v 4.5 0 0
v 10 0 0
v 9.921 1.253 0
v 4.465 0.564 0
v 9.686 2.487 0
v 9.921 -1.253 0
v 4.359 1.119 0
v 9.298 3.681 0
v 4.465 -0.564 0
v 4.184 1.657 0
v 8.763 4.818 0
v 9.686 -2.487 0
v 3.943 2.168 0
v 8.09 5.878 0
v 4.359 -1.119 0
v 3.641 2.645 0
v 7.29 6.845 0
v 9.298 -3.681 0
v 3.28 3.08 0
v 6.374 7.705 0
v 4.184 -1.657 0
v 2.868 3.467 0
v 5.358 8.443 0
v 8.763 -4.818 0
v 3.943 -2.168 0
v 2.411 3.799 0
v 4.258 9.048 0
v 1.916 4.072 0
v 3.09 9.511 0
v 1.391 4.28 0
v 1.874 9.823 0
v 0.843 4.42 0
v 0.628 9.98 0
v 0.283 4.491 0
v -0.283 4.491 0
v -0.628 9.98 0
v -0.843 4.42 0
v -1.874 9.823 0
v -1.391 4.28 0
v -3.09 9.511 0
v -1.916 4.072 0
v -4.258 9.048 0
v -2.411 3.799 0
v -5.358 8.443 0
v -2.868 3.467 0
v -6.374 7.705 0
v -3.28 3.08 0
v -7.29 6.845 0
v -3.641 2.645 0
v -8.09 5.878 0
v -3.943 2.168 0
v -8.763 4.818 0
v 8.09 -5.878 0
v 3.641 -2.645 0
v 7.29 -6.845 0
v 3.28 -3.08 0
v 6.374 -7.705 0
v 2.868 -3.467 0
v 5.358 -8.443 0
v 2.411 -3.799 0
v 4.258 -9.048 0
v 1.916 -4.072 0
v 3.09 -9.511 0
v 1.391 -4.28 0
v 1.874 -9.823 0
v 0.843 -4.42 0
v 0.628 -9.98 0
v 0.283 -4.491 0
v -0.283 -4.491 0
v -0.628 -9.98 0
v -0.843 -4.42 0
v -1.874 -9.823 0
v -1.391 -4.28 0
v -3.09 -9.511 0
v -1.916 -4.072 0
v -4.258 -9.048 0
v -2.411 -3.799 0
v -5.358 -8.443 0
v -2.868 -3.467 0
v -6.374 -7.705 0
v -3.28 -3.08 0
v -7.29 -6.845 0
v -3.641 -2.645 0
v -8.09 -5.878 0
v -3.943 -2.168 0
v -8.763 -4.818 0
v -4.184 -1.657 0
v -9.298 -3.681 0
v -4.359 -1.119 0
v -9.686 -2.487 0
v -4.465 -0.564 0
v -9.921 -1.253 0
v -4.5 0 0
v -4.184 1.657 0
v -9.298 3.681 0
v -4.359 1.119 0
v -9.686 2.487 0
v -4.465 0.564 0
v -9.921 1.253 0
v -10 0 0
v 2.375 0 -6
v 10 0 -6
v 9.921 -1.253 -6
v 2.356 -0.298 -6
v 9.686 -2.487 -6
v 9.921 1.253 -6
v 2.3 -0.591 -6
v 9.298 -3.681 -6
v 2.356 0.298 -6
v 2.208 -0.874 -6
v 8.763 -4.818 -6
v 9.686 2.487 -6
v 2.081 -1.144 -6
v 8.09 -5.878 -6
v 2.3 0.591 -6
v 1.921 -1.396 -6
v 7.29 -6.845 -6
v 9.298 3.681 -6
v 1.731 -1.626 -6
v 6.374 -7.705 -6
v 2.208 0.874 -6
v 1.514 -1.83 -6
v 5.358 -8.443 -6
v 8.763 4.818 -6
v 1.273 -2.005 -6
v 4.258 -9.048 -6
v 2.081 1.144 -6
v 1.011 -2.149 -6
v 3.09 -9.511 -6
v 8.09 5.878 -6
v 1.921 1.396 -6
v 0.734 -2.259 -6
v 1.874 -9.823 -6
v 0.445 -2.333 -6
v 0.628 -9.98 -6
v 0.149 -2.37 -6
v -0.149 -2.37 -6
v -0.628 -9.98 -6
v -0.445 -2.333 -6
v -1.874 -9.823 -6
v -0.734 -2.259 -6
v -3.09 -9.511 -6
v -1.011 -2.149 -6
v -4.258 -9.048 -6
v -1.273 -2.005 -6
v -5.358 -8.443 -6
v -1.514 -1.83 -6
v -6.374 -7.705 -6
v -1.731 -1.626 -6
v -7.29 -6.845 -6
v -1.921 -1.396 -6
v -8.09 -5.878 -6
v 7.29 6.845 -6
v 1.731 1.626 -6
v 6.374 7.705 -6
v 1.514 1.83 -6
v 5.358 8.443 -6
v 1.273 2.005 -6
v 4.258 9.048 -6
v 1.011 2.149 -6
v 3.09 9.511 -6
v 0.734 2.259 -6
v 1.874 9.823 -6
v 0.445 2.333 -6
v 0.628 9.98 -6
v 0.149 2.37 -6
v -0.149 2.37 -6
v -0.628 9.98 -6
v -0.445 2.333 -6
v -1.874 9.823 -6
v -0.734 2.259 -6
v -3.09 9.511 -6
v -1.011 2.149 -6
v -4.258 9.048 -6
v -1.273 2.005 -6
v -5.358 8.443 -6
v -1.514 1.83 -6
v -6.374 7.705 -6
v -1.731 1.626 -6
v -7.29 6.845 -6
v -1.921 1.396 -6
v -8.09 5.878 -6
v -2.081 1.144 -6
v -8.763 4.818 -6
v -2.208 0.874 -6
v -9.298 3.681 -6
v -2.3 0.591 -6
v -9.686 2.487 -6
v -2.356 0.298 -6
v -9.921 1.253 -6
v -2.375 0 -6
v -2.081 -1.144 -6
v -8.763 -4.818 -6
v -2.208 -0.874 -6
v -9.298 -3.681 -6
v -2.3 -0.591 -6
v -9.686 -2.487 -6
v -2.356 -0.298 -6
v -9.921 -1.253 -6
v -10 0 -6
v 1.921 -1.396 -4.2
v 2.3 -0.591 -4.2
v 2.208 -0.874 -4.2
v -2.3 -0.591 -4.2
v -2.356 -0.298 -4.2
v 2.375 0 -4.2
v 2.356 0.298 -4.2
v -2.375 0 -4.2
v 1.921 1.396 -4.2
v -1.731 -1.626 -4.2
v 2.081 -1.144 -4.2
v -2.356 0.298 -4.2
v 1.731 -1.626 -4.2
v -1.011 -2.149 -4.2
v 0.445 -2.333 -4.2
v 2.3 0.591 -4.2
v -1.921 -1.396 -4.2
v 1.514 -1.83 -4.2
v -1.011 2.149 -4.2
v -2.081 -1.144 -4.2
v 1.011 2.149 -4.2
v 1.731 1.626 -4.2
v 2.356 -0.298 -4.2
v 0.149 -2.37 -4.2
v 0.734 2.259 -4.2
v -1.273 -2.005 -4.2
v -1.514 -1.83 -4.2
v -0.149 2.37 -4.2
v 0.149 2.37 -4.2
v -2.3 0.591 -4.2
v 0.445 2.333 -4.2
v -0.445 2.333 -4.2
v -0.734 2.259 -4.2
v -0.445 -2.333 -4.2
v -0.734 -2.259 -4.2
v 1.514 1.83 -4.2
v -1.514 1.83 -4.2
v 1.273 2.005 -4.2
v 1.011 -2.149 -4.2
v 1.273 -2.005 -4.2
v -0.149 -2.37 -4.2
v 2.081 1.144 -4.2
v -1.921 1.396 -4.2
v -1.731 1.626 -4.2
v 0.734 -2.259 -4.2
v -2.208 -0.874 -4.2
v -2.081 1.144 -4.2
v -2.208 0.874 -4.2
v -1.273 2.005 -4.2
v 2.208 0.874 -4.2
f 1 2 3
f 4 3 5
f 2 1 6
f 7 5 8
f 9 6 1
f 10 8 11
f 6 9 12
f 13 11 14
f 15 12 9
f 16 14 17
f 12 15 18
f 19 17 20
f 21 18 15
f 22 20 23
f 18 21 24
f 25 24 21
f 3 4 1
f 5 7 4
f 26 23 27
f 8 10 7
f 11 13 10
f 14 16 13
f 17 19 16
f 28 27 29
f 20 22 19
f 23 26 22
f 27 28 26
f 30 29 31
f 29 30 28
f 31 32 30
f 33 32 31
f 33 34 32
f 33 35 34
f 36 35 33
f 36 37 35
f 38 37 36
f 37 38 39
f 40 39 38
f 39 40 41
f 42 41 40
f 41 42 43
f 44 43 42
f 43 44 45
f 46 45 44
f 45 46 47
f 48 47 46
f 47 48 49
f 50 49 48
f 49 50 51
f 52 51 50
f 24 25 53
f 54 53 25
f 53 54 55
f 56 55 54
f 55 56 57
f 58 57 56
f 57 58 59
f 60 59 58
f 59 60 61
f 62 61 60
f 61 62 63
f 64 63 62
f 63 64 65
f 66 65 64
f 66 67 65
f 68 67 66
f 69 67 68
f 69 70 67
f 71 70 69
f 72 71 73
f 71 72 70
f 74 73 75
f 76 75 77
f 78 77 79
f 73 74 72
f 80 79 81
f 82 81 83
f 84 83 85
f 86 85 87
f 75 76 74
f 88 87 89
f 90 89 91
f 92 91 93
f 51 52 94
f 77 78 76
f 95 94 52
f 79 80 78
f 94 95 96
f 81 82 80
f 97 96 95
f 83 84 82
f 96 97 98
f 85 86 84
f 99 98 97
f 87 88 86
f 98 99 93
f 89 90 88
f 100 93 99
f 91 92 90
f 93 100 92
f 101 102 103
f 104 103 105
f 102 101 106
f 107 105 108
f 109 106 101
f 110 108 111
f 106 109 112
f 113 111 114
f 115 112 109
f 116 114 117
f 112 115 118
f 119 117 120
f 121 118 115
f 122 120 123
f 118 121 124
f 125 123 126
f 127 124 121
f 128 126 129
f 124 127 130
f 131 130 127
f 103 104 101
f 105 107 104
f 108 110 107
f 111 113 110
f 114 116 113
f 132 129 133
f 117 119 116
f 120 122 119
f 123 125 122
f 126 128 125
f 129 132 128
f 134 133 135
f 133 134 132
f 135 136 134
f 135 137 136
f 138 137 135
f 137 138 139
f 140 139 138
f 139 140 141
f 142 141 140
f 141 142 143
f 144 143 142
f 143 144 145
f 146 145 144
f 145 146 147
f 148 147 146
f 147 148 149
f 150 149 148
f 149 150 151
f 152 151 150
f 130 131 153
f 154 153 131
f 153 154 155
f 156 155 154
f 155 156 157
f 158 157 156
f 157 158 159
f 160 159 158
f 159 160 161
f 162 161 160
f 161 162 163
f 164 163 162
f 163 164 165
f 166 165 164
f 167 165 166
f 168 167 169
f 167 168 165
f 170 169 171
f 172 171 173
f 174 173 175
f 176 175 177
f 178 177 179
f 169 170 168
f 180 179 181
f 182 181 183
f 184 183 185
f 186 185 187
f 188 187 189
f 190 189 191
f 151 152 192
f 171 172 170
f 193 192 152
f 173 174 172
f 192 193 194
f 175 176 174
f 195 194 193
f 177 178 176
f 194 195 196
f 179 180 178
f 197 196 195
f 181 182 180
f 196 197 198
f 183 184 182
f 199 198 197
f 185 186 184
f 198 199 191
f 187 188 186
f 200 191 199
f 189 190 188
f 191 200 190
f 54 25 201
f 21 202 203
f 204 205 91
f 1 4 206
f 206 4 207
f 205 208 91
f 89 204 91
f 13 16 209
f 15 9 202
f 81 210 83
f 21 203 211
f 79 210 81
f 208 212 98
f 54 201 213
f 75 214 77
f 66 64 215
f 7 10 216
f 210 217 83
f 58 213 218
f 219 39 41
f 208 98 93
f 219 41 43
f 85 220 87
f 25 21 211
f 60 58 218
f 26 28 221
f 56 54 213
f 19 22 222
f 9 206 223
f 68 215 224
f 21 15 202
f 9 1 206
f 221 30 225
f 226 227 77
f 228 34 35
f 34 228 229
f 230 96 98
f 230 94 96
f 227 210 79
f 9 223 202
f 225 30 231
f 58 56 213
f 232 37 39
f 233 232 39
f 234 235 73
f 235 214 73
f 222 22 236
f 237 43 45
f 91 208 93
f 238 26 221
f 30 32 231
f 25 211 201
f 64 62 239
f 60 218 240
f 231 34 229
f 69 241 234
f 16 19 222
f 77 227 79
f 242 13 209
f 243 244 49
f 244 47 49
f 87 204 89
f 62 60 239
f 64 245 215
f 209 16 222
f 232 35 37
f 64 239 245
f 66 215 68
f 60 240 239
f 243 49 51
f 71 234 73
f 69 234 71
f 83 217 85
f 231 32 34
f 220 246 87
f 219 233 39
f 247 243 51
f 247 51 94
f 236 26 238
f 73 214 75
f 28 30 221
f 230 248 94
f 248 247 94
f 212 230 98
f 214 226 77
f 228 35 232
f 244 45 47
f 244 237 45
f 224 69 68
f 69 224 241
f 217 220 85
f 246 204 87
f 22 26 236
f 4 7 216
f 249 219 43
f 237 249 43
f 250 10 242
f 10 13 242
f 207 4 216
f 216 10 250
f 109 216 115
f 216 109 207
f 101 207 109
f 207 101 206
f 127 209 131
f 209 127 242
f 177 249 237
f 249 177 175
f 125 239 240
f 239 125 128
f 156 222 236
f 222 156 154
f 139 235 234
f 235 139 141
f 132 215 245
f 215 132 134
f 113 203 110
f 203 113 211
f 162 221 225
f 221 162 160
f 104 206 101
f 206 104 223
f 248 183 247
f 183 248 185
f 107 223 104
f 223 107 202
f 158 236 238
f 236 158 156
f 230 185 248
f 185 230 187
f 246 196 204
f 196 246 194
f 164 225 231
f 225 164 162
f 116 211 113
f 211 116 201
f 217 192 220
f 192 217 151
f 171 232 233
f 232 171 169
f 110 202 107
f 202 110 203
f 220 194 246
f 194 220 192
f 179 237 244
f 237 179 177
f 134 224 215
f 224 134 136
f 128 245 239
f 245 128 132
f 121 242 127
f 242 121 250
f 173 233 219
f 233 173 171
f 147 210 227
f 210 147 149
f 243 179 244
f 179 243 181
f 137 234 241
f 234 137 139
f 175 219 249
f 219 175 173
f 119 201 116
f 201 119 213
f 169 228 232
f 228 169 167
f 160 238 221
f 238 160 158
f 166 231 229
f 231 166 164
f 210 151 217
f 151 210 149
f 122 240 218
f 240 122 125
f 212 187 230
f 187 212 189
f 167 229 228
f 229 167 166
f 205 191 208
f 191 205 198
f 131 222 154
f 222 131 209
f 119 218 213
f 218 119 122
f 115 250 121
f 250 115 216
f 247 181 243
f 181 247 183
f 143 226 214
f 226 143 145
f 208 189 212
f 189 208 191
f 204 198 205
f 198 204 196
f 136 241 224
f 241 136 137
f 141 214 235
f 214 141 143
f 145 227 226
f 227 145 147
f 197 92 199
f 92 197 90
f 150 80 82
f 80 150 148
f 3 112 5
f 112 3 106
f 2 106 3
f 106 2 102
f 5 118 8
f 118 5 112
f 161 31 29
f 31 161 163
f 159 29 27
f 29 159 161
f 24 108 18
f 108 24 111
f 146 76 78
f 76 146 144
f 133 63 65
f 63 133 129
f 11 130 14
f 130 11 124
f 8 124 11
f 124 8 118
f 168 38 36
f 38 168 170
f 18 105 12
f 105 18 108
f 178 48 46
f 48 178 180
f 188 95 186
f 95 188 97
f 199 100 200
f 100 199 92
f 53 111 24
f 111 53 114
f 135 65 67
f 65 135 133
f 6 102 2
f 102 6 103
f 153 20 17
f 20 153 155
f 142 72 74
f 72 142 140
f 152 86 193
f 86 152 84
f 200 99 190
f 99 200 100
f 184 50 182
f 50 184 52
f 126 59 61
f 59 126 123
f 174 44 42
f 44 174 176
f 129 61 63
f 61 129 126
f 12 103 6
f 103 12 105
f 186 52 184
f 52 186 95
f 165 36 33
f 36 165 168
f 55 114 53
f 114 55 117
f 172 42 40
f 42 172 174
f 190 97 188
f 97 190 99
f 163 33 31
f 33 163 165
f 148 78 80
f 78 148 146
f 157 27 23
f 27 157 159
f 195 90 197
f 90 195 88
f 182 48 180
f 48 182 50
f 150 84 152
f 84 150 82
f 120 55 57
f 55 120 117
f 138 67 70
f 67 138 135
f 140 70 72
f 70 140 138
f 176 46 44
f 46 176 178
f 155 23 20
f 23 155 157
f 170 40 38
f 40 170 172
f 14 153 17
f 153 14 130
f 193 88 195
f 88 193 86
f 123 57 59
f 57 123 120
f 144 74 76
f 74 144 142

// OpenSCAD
$fn = 50;


difference() {
	union() {
		translate(v = [0, 0, -6.0000000000]) {
			cylinder(h = 6, r = 10.0000000000);
		}
	}
	union() {
		translate(v = [0, 0, 0]) {
			rotate(a = [0, 0, 0]) {
				difference() {
					union() {
						#translate(v = [0, 0, -6.0000000000]) {
							cylinder(h = 6, r = 2.2500000000);
						}
						#translate(v = [0, 0, -4.2000000000]) {
							cylinder(h = 4.2000000000, r1 = 2.3750000000, r2 = 4.5000000000);
						}
						#translate(v = [0, 0, -6.0000000000]) {
							cylinder(h = 6, r = 2.3750000000);
						}
						#translate(v = [0, 0, -6.0000000000]) {
							cylinder(h = 6, r = 2.2500000000);
						}
					}
					union();
				}
			}
		}
	}
}
